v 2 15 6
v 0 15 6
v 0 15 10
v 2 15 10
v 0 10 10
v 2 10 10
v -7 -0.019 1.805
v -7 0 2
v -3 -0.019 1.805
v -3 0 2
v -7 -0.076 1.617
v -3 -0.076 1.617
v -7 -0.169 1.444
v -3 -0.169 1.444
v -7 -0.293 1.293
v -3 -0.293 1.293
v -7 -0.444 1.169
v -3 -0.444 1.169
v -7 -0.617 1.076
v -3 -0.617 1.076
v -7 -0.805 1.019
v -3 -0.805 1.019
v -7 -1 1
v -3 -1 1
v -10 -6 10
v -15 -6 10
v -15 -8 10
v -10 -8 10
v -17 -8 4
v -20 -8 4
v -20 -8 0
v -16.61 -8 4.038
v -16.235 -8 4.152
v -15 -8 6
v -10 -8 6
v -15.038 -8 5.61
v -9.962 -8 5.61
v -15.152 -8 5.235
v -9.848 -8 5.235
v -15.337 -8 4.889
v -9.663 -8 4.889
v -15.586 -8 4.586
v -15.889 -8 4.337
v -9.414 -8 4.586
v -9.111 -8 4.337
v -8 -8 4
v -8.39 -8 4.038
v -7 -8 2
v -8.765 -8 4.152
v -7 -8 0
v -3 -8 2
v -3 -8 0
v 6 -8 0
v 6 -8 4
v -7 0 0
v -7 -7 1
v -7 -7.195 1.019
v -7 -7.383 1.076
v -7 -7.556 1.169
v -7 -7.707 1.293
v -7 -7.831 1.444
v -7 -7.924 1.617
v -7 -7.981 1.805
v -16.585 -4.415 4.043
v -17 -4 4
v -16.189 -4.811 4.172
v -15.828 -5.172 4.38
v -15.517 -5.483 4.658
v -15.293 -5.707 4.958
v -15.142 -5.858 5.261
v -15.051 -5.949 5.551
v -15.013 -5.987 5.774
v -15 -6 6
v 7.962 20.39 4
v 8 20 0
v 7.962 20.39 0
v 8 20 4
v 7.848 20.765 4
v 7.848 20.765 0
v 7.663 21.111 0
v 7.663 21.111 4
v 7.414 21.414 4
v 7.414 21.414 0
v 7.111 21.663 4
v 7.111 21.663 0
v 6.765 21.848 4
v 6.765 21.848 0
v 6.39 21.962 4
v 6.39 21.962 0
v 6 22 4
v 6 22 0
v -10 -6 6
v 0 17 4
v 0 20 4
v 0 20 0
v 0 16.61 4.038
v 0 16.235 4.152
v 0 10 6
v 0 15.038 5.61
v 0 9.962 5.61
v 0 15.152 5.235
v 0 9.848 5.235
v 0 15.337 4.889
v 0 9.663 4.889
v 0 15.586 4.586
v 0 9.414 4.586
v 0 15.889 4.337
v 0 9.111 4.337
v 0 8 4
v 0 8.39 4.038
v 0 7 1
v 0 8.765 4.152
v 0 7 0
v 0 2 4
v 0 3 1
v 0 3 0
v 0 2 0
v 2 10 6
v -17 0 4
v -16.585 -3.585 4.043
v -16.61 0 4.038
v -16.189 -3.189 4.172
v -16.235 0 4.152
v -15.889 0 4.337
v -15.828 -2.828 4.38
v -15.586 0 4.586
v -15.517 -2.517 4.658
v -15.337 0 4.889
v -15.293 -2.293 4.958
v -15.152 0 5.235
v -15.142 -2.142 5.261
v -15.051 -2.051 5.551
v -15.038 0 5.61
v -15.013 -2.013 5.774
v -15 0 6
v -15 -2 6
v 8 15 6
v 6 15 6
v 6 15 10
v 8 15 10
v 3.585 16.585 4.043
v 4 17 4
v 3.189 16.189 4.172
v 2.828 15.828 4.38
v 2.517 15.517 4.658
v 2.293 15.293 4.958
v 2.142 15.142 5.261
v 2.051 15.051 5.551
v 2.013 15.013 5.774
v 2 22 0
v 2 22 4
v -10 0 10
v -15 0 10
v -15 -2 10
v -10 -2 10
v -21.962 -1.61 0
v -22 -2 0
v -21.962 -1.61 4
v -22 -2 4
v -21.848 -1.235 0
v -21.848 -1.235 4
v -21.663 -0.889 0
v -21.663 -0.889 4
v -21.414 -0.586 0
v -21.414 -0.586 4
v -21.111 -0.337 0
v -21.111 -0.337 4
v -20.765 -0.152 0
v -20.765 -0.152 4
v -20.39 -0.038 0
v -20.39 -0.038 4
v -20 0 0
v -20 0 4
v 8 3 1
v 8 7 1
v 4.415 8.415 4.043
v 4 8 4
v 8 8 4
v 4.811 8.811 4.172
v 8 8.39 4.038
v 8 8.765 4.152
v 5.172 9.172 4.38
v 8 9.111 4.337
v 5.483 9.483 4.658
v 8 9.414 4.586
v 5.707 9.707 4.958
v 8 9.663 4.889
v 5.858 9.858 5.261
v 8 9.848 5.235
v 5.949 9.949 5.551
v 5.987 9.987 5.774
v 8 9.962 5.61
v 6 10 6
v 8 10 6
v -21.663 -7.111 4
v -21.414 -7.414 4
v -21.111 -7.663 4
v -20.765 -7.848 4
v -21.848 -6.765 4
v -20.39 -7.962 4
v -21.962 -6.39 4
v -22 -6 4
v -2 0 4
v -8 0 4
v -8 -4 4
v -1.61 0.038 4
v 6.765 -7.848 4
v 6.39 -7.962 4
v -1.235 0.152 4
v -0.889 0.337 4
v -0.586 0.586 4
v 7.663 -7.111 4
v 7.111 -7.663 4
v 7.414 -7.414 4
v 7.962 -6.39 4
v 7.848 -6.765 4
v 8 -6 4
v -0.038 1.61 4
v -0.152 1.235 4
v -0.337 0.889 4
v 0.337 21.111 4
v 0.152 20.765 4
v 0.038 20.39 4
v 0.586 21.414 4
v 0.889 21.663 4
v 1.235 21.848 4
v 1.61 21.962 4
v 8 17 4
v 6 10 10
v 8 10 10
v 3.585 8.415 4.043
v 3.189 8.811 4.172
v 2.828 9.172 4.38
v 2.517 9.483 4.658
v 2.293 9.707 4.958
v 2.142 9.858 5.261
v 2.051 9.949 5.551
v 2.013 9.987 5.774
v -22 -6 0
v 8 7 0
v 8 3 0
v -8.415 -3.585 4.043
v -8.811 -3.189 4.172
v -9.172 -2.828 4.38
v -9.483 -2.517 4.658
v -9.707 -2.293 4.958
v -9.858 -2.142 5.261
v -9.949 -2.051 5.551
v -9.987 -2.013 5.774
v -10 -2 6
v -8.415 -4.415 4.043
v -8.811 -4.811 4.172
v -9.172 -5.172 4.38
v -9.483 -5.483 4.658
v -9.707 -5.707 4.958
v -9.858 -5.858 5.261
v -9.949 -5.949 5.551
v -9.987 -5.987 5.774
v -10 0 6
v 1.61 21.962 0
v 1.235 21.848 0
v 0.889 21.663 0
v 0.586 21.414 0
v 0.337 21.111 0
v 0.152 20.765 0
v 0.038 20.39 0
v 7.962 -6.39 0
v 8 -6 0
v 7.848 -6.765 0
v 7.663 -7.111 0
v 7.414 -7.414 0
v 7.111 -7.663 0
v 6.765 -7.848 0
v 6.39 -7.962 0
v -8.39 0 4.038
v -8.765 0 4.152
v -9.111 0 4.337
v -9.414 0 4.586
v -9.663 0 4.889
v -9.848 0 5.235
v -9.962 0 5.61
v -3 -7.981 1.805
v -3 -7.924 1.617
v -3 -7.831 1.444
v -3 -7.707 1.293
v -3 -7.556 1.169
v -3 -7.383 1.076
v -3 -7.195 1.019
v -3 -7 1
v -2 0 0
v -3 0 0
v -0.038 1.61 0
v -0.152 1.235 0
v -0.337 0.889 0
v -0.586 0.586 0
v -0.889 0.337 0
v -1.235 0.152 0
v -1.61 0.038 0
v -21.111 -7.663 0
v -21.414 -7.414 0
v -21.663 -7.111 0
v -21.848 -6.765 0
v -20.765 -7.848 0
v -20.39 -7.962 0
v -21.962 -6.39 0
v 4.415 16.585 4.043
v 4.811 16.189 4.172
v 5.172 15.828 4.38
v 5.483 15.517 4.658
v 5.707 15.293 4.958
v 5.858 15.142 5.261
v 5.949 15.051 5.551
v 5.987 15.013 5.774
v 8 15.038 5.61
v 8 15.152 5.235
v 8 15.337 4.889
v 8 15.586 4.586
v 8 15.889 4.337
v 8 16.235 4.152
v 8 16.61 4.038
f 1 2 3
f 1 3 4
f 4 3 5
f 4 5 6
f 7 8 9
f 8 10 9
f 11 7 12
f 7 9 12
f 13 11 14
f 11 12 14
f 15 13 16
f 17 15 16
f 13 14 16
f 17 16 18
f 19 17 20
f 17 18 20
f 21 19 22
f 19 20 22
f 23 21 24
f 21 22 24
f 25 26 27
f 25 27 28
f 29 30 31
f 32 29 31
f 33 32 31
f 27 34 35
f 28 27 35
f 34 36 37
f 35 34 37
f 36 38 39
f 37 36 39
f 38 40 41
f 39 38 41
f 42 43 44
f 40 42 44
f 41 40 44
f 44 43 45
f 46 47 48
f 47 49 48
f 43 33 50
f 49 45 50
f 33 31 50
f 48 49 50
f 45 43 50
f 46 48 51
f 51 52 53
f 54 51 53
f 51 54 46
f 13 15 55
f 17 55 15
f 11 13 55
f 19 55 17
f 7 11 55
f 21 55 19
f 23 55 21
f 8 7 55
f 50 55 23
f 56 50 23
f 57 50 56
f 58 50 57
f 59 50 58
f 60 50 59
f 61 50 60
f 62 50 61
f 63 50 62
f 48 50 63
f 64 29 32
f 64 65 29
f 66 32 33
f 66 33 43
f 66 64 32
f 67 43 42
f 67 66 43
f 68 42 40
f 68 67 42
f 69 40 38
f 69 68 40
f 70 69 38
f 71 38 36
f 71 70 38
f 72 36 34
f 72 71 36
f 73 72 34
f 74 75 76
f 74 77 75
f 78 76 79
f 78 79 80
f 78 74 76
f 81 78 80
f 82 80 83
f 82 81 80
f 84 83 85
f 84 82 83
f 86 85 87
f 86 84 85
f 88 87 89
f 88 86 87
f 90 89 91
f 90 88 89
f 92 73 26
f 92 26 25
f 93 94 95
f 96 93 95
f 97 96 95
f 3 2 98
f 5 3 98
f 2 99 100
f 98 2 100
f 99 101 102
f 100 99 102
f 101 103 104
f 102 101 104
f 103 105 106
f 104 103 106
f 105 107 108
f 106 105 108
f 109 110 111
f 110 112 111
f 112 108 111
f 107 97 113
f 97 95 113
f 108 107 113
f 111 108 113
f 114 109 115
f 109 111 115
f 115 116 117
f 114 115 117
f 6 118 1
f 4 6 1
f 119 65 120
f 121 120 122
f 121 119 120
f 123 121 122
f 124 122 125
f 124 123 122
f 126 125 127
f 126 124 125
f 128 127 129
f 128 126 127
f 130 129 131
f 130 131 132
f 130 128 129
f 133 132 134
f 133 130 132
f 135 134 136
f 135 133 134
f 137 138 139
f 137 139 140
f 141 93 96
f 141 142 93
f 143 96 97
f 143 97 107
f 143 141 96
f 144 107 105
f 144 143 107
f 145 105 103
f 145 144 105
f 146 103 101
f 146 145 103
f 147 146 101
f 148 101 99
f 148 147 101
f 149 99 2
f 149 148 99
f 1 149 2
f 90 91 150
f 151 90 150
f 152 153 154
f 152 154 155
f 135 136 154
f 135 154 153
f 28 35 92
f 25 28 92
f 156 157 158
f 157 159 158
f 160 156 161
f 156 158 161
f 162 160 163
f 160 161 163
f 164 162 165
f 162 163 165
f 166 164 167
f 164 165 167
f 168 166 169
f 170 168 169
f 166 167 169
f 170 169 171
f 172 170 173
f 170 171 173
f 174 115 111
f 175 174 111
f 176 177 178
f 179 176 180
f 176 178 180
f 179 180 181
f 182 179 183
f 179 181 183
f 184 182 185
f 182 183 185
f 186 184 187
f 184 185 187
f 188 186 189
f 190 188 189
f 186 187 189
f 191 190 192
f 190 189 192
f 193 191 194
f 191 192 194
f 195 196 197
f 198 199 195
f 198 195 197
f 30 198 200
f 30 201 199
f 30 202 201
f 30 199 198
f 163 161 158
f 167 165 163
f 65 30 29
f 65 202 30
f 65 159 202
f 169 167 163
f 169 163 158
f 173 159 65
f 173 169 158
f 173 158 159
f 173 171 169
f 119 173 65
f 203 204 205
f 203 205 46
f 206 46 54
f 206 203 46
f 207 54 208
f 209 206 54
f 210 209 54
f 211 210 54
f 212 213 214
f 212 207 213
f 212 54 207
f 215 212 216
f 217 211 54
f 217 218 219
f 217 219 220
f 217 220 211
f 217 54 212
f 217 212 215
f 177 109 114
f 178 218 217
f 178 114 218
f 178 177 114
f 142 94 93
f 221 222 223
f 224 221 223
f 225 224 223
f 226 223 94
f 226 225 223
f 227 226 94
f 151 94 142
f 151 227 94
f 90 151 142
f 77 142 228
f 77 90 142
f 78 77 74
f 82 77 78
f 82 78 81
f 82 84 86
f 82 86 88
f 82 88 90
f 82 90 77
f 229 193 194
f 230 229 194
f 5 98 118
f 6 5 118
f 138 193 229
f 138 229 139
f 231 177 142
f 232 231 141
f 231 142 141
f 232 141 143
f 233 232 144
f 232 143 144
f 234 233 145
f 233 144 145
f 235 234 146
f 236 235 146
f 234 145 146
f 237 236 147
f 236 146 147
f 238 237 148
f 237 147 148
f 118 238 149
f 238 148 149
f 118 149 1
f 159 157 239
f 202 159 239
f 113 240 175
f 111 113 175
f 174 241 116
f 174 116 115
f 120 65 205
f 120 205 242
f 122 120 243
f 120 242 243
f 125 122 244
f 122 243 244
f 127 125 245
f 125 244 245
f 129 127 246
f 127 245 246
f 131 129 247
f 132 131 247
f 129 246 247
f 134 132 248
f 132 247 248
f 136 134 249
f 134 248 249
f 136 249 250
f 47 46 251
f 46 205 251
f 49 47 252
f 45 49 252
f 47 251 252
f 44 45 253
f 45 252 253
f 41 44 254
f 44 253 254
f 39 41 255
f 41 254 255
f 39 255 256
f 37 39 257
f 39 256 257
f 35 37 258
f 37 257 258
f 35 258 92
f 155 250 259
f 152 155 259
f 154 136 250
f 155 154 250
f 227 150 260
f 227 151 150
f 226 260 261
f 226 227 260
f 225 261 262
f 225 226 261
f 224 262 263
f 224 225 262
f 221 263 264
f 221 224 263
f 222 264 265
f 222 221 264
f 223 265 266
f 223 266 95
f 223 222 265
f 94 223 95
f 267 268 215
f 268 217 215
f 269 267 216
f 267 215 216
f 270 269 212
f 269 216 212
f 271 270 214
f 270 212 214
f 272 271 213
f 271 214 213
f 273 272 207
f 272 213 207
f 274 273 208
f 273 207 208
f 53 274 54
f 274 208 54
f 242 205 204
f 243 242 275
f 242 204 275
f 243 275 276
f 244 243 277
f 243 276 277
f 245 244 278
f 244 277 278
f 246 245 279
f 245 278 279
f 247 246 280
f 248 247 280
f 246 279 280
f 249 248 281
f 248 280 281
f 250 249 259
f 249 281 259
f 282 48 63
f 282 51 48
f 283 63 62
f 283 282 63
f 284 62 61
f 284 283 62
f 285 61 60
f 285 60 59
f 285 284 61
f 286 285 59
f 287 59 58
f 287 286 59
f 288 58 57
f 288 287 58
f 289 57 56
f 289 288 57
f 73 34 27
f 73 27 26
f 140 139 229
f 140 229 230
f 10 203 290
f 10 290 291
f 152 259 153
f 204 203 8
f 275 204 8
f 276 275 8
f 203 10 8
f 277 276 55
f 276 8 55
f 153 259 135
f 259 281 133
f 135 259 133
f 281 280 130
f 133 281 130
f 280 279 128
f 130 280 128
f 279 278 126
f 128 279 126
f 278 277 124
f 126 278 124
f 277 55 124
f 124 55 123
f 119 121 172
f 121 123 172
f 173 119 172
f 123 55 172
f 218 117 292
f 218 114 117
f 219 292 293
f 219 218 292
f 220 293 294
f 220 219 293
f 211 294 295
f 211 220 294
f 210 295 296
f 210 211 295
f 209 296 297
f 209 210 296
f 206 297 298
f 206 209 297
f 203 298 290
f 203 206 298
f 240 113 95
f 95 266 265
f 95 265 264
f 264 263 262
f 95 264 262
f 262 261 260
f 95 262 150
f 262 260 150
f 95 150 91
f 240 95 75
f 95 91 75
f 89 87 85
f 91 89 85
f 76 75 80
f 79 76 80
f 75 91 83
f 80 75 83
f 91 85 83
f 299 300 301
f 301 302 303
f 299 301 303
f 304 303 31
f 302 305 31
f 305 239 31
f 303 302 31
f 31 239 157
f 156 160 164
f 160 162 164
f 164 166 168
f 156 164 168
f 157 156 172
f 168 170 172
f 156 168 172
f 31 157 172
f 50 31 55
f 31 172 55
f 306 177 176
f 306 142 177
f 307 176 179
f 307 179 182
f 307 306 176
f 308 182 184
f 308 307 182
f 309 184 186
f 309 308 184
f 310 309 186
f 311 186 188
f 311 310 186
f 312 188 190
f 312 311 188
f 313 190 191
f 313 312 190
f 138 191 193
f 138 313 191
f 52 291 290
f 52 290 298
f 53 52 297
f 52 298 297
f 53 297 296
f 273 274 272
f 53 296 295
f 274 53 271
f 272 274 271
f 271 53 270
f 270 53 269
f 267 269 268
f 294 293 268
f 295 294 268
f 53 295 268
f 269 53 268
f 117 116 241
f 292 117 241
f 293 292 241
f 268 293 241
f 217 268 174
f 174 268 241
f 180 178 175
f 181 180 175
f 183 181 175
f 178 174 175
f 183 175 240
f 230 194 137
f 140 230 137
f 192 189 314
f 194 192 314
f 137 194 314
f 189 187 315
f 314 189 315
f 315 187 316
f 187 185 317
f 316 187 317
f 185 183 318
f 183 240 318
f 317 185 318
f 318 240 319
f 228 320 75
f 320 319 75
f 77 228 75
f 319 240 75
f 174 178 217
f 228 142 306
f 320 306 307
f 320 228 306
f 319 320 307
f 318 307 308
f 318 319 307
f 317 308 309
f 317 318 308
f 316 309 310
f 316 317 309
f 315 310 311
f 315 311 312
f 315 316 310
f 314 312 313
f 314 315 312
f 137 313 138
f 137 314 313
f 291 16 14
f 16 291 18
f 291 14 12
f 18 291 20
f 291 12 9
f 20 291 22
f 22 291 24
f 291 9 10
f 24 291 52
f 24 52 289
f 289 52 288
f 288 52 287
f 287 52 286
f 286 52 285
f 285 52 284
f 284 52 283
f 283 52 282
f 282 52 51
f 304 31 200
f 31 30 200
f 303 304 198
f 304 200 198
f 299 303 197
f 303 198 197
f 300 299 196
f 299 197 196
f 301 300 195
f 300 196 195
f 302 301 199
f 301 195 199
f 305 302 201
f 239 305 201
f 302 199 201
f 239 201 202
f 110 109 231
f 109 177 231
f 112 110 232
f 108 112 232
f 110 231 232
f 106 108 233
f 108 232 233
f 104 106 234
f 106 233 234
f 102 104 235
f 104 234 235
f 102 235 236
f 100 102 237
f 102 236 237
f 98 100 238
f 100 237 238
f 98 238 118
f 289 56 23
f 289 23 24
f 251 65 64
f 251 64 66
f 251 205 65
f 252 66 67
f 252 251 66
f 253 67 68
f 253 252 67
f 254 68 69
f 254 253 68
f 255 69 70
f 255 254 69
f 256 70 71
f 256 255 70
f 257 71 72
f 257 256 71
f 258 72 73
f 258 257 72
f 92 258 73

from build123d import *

# Parameters (mm, degrees)
F1_DEPTH = 4
F2_W     = 2
F2_H     = 5
F2_W_2   = 5
F2_H_2   = 2
F3_DEPTH = 6
F4_R     = 1.99999
F5_W     = 4
F5_H     = 1
F6_DEPTH = 25
F7_R     = 1
F8_W     = 4
F8_H     = 1
F9_DEPTH = 25


# Not quite as in the source:
# - a fillet or chamfer is up to 0.001 mm smaller than in the source, because OpenCascade refuses the exact size


with BuildPart() as f1:
    # F0 (on Top) → F1 (new body)
    with BuildSketch(Plane.XY):
        Polygon((8, -8), (8, 22), (0, 22), (0, 0), (-22, 0), (-22, -8), align=None)
    extrude(amount=F1_DEPTH)

    # F2 (on face) → F3 (join)
    with BuildSketch(Plane.XY.offset(4)):
        with Locations((1, 12.5)):
            Rectangle(F2_W, F2_H)
        with Locations((7, 12.5)):
            Rectangle(F2_W, F2_H)
        with Locations((-12.5, -1)):
            Rectangle(F2_W_2, F2_H_2)
        with Locations((-12.5, -7)):
            Rectangle(F2_W_2, F2_H_2)
    extrude(amount=F3_DEPTH)

    # F4 (radius 2 in the source; OpenCascade refuses exactly that, so slightly less here)
    f4_edges = [f1.edges().sort_by_distance(p)[0] for p in [
        (1, 15, 4),
        (2, 12.5, 4),
        (7, 15, 4),
        (-12.5, -6, 4),
        (-10, -7, 4),
        (1, 10, 4),
        (7, 10, 4),
        (6, 12.5, 4),
        (-15, -7, 4),
        (0, 0, 2),
        (8, -8, 2),
        (-15, -1, 4),
        (-12.5, -2, 4),
        (-10, -1, 4),
        (8, 22, 2),
        (0, 22, 2),
        (-22, -8, 2),
        (-22, 0, 2),
    ]]
    fillet(f4_edges, radius=F4_R)

    # F5 (on face) → F6 (cut)
    with BuildSketch(Plane.XZ.offset(8)):
        with Locations((-5, 0.5)):
            Rectangle(F5_W, F5_H)
    extrude(amount=-F6_DEPTH, mode=Mode.SUBTRACT)

    # F7
    f7_edges = [f1.edges().sort_by_distance(p)[0] for p in [
        (-5, -8, 1),
        (-5, 0, 1),
    ]]
    fillet(f7_edges, radius=F7_R)

    # F8 (on face) → F9 (cut)
    with BuildSketch(Plane.YZ.offset(8)):
        with Locations((5, 0.5)):
            Rectangle(F8_W, F8_H)
    extrude(amount=-F9_DEPTH, mode=Mode.SUBTRACT)


solid = f1.part
